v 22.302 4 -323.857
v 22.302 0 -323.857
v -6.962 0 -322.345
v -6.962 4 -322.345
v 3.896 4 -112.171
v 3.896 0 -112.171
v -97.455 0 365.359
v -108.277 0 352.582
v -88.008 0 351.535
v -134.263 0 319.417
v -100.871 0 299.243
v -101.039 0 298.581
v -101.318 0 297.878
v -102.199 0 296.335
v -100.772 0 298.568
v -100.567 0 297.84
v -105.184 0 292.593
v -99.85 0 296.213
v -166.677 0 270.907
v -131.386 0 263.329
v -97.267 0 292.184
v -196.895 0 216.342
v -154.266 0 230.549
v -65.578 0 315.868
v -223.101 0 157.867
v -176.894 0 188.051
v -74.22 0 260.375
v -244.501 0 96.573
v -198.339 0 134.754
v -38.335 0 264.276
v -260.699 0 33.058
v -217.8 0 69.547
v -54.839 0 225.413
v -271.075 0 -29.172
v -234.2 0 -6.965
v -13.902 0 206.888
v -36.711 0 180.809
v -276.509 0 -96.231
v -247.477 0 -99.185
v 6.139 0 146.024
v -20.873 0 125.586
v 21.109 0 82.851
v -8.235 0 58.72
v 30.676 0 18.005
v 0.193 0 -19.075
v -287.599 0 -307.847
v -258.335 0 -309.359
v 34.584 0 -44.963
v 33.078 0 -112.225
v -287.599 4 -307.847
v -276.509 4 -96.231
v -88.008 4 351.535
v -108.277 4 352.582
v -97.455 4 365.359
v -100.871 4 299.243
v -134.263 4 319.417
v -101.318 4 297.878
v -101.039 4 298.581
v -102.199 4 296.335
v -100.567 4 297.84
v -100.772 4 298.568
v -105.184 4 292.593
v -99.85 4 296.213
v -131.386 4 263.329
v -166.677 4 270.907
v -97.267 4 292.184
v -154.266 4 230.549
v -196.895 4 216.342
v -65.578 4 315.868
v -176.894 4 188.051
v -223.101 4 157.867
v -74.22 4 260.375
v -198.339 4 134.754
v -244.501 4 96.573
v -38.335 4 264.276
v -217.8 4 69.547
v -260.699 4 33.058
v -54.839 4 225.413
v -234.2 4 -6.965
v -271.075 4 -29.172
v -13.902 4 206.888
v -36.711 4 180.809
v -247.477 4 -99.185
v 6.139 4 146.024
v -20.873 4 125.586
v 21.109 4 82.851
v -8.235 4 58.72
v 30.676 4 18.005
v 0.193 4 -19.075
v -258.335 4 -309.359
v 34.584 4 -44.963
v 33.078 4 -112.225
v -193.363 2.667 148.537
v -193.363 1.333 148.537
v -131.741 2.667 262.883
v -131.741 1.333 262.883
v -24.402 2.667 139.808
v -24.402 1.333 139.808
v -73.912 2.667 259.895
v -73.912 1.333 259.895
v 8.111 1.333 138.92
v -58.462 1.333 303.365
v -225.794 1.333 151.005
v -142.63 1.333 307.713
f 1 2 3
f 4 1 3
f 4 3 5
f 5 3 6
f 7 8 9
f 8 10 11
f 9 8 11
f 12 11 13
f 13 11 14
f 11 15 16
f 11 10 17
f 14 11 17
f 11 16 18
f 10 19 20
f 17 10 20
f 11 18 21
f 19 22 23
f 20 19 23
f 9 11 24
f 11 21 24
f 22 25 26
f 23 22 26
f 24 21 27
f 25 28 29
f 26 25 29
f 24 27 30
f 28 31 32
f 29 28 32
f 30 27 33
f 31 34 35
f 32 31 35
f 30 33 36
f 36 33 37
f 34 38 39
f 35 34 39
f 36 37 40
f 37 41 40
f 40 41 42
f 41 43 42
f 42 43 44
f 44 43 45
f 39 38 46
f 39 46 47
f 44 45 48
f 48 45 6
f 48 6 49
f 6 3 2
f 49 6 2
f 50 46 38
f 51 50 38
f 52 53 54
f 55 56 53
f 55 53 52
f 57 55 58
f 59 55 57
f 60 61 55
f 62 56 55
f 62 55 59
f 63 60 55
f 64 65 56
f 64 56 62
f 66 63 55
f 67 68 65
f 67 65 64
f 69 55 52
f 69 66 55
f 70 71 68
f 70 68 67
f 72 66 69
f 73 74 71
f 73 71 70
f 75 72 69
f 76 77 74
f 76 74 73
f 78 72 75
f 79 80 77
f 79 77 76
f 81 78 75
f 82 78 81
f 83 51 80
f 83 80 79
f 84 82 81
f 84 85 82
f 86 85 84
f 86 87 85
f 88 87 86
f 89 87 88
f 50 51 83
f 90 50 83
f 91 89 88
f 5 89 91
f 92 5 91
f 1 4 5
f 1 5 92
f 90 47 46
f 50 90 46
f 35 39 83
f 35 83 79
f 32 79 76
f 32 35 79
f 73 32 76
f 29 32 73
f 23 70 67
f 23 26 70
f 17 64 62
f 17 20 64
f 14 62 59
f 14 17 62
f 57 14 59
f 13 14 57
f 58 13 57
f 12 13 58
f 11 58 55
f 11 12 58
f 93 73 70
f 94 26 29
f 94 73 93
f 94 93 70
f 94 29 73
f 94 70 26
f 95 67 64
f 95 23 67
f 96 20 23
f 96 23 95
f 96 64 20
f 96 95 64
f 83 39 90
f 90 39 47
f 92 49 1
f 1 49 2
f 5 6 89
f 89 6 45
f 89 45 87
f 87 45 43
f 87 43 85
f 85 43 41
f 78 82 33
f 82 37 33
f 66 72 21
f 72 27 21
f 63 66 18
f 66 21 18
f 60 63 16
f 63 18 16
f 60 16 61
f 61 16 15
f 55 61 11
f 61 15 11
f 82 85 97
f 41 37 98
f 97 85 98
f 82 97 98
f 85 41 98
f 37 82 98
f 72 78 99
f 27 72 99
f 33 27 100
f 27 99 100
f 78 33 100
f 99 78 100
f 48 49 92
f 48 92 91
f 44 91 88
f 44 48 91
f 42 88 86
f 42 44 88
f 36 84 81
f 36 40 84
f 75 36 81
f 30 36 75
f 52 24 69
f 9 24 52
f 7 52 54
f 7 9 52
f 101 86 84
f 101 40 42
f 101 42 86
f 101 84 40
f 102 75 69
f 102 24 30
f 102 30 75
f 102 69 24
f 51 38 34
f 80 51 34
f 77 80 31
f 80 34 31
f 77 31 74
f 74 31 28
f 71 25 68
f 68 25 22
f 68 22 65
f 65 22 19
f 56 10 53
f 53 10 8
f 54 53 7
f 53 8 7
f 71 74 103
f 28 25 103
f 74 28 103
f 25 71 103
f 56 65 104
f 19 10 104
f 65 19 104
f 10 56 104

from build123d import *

# Parameters (mm, degrees)
BOSS_EXTRUDE1_DEPTH = 4


with BuildPart() as part:
    # Sketch1 → Boss-Extrude1 (new body)
    with BuildSketch(Plane(origin=(0, 0, 0), x_dir=(1, 0, 0), z_dir=(0, 1, 0))):
        with BuildLine():
            Line((-287.599492609, 307.846688721), (-276.509158993, 96.230517076))
            add(Edge.make_bspline(
                [(-276.509158993, 96.230517076), (-265.498754924, -193.422418568), (-100.154473104, -360.089981136), (-97.455270859, -365.359331923)],
                knots=[0, 0, 0, 0, 1, 1, 1, 1], degree=3))
            Line((-97.455270859, -365.359331923), (-100.871017472, -299.24345381))
            add(Edge.make_bspline(
                [(-247.476970144, 99.184701956), (-209.870171036, -233.687963111), (-103.612719847, -283.411888875), (-100.871017472, -299.24345381)],
                knots=[0, 0, 0, 0, 1, 1, 1, 1], degree=3))
            Line((-247.476970144, 99.184701956), (-258.335189119, 309.358571318))
            Line((-258.335189119, 309.358571318), (-287.599492609, 307.846688721))
        make_face()
        with BuildLine():
            Line((-6.962227222, 322.345260258), (3.895991753, 112.171390896))
            add(Edge.make_bspline(
                [(3.895991753, 112.171390896), (0.792272957, -222.80450289), (-99.775370482, -283.213639779), (-100.871017472, -299.24345381)],
                knots=[0, 0, 0, 0, 1, 1, 1, 1], degree=3))
            Line((-100.871017472, -299.24345381), (-97.455270859, -365.359331923))
            add(Edge.make_bspline(
                [(33.078047071, 112.224730275), (51.975289253, -177.020747413), (-95.313450893, -359.839879259), (-97.455270859, -365.359331923)],
                knots=[0, 0, 0, 0, 1, 1, 1, 1], degree=3))
            Line((33.078047071, 112.224730275), (22.302076268, 323.857142855))
            Line((22.302076268, 323.857142855), (-6.962227222, 322.345260258))
        make_face()
    extrude(amount=BOSS_EXTRUDE1_DEPTH)


solid = part.part
